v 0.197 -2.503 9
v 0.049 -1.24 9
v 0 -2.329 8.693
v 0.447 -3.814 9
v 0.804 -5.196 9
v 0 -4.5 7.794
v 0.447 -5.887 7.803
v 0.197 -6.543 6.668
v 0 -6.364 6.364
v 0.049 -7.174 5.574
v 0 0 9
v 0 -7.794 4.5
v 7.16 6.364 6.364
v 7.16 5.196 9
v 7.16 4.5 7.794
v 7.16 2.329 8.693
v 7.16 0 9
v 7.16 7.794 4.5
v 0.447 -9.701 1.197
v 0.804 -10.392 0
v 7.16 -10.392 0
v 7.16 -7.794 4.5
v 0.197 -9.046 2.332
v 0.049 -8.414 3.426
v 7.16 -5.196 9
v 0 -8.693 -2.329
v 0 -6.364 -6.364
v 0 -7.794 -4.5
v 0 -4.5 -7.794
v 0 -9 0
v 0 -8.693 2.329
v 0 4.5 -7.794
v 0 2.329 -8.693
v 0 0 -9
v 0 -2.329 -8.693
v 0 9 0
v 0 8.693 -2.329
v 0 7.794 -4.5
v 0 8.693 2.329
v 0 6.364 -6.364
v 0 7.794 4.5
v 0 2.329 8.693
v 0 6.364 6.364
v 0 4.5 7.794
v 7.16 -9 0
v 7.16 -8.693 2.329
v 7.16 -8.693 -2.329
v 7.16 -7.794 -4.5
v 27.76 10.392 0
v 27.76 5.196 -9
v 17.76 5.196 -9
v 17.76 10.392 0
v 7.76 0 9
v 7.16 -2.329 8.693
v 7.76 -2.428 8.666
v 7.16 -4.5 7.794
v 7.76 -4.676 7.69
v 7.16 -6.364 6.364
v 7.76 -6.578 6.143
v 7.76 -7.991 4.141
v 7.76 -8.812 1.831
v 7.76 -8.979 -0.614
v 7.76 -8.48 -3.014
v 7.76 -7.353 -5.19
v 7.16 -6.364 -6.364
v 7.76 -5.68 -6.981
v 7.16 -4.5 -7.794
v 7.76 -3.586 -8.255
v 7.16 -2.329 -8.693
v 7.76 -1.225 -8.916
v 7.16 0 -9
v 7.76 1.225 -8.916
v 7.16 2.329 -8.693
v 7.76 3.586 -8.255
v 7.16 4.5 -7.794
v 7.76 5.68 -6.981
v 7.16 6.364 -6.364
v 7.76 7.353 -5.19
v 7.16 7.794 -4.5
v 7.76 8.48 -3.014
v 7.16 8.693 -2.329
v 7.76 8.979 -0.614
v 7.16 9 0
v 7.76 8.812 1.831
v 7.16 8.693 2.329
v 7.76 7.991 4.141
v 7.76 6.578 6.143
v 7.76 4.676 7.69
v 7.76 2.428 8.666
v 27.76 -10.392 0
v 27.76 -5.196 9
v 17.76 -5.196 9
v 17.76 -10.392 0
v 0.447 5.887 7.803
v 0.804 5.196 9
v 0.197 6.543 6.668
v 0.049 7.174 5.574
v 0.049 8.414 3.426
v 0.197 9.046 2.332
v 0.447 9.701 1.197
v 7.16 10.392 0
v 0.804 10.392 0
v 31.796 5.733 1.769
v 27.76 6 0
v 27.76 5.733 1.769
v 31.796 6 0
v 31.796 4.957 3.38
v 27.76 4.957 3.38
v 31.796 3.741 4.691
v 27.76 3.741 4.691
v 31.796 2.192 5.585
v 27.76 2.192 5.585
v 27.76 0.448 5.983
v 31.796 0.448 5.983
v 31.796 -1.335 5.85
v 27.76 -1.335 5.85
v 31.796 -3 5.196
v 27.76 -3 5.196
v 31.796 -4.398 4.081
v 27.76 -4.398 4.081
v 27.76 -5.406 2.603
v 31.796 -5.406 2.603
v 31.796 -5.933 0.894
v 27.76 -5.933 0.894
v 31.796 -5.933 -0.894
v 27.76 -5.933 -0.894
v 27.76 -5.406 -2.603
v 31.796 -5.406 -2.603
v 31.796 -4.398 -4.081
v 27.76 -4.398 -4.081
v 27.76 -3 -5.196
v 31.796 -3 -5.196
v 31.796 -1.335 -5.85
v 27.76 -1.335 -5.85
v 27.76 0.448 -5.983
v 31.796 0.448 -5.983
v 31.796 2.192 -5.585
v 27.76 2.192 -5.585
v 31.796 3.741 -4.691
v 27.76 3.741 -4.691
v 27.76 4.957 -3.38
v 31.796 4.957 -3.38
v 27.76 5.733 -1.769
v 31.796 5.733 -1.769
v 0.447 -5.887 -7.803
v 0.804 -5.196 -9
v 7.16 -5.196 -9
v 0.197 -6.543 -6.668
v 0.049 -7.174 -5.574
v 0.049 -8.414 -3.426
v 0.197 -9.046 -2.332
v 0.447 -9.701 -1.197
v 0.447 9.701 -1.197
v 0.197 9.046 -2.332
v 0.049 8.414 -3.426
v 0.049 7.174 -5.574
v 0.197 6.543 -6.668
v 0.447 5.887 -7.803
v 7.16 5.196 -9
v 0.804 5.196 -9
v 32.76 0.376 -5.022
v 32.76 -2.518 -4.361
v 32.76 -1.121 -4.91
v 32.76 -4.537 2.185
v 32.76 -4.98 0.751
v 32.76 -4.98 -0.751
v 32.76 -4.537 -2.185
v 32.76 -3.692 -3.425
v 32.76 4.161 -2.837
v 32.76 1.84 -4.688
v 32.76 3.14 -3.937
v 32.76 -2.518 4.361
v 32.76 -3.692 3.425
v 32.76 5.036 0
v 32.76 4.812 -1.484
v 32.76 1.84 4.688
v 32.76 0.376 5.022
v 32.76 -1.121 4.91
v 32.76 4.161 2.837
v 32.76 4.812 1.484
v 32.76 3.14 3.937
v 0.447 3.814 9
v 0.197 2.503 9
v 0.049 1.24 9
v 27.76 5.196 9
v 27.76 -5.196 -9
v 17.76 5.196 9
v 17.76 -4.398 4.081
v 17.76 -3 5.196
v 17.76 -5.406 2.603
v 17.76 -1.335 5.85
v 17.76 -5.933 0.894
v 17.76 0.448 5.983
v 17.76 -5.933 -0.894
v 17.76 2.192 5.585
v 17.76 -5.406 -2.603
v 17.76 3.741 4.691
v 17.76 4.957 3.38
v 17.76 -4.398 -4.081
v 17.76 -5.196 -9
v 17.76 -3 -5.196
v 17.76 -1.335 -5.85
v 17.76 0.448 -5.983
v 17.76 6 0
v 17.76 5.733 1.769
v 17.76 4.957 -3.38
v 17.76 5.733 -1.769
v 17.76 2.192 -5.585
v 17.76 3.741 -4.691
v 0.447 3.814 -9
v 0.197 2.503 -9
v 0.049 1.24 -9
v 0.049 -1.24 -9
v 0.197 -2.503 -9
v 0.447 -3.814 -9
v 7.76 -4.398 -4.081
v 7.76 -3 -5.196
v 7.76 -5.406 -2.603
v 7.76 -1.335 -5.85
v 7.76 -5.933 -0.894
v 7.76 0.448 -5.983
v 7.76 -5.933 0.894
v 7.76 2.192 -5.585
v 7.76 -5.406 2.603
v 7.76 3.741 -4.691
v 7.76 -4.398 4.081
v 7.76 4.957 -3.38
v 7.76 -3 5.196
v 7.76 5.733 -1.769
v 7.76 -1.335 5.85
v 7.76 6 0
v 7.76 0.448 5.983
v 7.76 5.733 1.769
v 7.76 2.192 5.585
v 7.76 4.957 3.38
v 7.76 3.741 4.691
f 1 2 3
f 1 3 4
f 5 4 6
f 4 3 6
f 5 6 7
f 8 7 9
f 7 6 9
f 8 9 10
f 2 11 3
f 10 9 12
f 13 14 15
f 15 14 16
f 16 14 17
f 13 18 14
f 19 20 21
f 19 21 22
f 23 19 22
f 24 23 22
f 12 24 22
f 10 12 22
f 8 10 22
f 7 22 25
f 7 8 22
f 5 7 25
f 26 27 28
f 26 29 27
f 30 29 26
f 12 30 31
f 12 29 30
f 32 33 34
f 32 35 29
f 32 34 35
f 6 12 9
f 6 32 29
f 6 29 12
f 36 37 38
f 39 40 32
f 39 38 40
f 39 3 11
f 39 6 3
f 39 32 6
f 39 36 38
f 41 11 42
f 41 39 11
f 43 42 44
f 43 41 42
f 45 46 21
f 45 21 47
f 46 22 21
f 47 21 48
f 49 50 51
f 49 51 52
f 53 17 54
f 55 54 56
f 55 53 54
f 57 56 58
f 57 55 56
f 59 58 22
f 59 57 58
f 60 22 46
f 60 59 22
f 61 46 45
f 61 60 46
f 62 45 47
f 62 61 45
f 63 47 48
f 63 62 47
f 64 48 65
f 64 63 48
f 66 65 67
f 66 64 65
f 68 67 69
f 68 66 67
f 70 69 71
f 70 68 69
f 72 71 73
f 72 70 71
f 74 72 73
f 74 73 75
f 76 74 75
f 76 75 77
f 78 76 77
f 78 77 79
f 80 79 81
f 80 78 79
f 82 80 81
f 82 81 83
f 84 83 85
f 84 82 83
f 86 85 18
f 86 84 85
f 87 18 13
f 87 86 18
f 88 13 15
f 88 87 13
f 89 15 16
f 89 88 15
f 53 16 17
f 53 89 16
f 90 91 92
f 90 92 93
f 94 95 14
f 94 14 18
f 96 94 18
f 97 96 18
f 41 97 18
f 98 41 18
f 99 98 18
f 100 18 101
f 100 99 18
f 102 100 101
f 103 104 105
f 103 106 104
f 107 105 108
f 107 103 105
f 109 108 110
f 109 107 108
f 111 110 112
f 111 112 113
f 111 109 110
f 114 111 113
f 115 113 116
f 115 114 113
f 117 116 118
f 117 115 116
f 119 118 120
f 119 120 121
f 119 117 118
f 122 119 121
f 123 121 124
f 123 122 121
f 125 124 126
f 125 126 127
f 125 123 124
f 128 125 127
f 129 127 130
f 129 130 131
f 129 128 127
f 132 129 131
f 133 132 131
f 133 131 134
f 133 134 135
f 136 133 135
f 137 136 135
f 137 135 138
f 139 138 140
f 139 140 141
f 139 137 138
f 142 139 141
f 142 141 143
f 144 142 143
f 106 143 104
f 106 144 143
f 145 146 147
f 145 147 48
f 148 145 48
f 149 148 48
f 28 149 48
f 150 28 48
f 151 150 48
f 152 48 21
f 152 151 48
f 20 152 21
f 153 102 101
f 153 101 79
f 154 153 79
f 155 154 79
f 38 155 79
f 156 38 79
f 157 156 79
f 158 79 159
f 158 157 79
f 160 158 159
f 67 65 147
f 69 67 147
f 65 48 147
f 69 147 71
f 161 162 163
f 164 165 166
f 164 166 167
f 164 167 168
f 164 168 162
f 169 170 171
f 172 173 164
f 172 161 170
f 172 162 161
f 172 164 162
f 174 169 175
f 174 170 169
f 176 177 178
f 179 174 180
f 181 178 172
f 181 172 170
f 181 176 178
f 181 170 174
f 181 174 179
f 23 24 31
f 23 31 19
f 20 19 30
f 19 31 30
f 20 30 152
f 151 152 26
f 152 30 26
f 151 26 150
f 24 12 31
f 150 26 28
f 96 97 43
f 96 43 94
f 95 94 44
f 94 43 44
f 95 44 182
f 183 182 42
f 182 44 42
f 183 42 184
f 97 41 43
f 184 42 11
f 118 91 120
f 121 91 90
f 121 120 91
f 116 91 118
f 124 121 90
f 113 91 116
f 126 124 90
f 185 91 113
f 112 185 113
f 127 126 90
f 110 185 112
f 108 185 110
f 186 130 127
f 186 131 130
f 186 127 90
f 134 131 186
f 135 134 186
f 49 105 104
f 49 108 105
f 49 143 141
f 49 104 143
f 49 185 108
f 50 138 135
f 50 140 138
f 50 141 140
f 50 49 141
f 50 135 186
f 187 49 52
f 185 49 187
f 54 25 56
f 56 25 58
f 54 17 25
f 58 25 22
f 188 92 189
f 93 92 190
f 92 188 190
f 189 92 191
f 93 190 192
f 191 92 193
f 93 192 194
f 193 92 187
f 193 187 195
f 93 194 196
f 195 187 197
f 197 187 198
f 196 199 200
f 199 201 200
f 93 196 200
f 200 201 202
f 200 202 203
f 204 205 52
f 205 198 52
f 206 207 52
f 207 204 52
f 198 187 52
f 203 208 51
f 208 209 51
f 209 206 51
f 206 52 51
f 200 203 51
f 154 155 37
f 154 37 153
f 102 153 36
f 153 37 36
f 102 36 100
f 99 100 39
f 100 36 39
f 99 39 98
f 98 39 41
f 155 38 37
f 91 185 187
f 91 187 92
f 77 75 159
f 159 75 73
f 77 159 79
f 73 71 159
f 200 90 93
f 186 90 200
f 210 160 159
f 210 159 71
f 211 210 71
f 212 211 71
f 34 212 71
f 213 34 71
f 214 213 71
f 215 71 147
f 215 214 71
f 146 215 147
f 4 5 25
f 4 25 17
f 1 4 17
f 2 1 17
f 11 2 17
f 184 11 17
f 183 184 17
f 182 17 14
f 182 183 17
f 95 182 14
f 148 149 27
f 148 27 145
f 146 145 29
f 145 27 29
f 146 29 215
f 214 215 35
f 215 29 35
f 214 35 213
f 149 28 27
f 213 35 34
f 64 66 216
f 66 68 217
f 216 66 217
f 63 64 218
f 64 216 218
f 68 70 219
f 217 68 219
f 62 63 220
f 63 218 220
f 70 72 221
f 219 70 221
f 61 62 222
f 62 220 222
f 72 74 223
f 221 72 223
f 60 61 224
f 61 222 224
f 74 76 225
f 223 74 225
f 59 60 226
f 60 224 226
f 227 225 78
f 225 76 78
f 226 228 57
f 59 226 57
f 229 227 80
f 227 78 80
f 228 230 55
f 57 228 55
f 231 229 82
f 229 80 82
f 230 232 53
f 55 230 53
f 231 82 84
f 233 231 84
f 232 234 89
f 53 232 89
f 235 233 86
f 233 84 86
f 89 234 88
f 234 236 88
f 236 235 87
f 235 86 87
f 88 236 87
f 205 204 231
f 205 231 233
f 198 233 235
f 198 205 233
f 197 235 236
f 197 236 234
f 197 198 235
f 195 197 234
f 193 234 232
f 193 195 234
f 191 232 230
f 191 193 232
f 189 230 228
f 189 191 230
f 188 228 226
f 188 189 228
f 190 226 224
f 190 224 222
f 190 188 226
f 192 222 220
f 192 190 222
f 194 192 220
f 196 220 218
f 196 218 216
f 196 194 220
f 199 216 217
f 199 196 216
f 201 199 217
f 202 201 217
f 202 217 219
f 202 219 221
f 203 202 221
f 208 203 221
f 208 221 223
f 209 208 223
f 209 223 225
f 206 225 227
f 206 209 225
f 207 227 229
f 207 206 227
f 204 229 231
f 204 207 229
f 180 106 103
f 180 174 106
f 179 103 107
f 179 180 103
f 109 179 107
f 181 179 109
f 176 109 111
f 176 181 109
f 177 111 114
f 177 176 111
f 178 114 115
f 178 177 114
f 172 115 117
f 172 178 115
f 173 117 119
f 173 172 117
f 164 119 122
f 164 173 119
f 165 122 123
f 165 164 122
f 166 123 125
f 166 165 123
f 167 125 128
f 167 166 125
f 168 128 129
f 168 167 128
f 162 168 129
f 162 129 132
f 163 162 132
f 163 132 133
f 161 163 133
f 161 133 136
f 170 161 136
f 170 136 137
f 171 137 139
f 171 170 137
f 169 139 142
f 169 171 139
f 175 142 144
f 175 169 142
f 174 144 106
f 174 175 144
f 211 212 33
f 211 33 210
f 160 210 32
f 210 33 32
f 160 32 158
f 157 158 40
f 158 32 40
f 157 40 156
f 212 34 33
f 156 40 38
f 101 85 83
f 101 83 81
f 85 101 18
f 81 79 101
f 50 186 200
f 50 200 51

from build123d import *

# Parameters (mm, degrees)
BASEHEAD_DEPTH      = 7.76
SKETCH4_W           = 0.6
SKETCH4_H           = 11.392304845
BOSS_EXTRUDE1_DEPTH = 10


# Read off the part's stored shape, not the designer's step: HeadChamfer
with BuildPart() as part:
    # Sketch1 → BaseHead (new body)
    with BuildSketch(Plane(origin=(0, 0, 0), x_dir=(0, 0, -1), z_dir=(1, 0, 0))):
        Polygon((9, 5.196152423), (9, -5.196152423), (0, -10.392304845), (-9, -5.196152423), (-9, 5.196152423), (0, 10.392304845), align=None)
    extrude(amount=BASEHEAD_DEPTH)

    # HeadChamfer outline → HeadChamfer (revolve, cut)
    with BuildSketch(Plane.YX):
        Polygon((10.392304847, 0.803847578), (9, 0), (10.392304847, 0), align=None)
    revolve(axis=Axis((0, 0, 0), (1, 0, 0)), mode=Mode.SUBTRACT)

    # HeadChamfer 2 outline → HeadChamfer 2 (revolve)
    with BuildSketch(Plane.YX):
        Polygon((6, 7.76), (6, 31.796), (5.036, 32.76), (0, 32.76), (0, 7.76), align=None)
    revolve(axis=Axis((0, 0, 0), (1, 0, 0)))

    # Sketch4 → BearingFace (revolve, cut)
    with BuildSketch(Plane.XY, mode=Mode.PRIVATE) as bearingface_sk:
        with Locations((7.46, 14.696152423)):
            Rectangle(SKETCH4_W, SKETCH4_H)
    revolve(bearingface_sk.sketch.rotate(Axis((0, 0, 0), (1, 0, 0)), 90), axis=Axis((0, 0, 0), (1, 0, 0)), mode=Mode.SUBTRACT)

    # Sketch5 → Boss-Extrude1 (add)
    with BuildSketch(Plane(origin=(27.76, 0, 0), x_dir=(0, 0, -1), z_dir=(1, 0, 0))):
        Polygon((0, 10.392304845), (-9, 5.196152423), (-9, -5.196152423), (0, -10.392304845), (9, -5.196152423), (9, 5.196152423), align=None)
    extrude(amount=-BOSS_EXTRUDE1_DEPTH)


solid = part.part
